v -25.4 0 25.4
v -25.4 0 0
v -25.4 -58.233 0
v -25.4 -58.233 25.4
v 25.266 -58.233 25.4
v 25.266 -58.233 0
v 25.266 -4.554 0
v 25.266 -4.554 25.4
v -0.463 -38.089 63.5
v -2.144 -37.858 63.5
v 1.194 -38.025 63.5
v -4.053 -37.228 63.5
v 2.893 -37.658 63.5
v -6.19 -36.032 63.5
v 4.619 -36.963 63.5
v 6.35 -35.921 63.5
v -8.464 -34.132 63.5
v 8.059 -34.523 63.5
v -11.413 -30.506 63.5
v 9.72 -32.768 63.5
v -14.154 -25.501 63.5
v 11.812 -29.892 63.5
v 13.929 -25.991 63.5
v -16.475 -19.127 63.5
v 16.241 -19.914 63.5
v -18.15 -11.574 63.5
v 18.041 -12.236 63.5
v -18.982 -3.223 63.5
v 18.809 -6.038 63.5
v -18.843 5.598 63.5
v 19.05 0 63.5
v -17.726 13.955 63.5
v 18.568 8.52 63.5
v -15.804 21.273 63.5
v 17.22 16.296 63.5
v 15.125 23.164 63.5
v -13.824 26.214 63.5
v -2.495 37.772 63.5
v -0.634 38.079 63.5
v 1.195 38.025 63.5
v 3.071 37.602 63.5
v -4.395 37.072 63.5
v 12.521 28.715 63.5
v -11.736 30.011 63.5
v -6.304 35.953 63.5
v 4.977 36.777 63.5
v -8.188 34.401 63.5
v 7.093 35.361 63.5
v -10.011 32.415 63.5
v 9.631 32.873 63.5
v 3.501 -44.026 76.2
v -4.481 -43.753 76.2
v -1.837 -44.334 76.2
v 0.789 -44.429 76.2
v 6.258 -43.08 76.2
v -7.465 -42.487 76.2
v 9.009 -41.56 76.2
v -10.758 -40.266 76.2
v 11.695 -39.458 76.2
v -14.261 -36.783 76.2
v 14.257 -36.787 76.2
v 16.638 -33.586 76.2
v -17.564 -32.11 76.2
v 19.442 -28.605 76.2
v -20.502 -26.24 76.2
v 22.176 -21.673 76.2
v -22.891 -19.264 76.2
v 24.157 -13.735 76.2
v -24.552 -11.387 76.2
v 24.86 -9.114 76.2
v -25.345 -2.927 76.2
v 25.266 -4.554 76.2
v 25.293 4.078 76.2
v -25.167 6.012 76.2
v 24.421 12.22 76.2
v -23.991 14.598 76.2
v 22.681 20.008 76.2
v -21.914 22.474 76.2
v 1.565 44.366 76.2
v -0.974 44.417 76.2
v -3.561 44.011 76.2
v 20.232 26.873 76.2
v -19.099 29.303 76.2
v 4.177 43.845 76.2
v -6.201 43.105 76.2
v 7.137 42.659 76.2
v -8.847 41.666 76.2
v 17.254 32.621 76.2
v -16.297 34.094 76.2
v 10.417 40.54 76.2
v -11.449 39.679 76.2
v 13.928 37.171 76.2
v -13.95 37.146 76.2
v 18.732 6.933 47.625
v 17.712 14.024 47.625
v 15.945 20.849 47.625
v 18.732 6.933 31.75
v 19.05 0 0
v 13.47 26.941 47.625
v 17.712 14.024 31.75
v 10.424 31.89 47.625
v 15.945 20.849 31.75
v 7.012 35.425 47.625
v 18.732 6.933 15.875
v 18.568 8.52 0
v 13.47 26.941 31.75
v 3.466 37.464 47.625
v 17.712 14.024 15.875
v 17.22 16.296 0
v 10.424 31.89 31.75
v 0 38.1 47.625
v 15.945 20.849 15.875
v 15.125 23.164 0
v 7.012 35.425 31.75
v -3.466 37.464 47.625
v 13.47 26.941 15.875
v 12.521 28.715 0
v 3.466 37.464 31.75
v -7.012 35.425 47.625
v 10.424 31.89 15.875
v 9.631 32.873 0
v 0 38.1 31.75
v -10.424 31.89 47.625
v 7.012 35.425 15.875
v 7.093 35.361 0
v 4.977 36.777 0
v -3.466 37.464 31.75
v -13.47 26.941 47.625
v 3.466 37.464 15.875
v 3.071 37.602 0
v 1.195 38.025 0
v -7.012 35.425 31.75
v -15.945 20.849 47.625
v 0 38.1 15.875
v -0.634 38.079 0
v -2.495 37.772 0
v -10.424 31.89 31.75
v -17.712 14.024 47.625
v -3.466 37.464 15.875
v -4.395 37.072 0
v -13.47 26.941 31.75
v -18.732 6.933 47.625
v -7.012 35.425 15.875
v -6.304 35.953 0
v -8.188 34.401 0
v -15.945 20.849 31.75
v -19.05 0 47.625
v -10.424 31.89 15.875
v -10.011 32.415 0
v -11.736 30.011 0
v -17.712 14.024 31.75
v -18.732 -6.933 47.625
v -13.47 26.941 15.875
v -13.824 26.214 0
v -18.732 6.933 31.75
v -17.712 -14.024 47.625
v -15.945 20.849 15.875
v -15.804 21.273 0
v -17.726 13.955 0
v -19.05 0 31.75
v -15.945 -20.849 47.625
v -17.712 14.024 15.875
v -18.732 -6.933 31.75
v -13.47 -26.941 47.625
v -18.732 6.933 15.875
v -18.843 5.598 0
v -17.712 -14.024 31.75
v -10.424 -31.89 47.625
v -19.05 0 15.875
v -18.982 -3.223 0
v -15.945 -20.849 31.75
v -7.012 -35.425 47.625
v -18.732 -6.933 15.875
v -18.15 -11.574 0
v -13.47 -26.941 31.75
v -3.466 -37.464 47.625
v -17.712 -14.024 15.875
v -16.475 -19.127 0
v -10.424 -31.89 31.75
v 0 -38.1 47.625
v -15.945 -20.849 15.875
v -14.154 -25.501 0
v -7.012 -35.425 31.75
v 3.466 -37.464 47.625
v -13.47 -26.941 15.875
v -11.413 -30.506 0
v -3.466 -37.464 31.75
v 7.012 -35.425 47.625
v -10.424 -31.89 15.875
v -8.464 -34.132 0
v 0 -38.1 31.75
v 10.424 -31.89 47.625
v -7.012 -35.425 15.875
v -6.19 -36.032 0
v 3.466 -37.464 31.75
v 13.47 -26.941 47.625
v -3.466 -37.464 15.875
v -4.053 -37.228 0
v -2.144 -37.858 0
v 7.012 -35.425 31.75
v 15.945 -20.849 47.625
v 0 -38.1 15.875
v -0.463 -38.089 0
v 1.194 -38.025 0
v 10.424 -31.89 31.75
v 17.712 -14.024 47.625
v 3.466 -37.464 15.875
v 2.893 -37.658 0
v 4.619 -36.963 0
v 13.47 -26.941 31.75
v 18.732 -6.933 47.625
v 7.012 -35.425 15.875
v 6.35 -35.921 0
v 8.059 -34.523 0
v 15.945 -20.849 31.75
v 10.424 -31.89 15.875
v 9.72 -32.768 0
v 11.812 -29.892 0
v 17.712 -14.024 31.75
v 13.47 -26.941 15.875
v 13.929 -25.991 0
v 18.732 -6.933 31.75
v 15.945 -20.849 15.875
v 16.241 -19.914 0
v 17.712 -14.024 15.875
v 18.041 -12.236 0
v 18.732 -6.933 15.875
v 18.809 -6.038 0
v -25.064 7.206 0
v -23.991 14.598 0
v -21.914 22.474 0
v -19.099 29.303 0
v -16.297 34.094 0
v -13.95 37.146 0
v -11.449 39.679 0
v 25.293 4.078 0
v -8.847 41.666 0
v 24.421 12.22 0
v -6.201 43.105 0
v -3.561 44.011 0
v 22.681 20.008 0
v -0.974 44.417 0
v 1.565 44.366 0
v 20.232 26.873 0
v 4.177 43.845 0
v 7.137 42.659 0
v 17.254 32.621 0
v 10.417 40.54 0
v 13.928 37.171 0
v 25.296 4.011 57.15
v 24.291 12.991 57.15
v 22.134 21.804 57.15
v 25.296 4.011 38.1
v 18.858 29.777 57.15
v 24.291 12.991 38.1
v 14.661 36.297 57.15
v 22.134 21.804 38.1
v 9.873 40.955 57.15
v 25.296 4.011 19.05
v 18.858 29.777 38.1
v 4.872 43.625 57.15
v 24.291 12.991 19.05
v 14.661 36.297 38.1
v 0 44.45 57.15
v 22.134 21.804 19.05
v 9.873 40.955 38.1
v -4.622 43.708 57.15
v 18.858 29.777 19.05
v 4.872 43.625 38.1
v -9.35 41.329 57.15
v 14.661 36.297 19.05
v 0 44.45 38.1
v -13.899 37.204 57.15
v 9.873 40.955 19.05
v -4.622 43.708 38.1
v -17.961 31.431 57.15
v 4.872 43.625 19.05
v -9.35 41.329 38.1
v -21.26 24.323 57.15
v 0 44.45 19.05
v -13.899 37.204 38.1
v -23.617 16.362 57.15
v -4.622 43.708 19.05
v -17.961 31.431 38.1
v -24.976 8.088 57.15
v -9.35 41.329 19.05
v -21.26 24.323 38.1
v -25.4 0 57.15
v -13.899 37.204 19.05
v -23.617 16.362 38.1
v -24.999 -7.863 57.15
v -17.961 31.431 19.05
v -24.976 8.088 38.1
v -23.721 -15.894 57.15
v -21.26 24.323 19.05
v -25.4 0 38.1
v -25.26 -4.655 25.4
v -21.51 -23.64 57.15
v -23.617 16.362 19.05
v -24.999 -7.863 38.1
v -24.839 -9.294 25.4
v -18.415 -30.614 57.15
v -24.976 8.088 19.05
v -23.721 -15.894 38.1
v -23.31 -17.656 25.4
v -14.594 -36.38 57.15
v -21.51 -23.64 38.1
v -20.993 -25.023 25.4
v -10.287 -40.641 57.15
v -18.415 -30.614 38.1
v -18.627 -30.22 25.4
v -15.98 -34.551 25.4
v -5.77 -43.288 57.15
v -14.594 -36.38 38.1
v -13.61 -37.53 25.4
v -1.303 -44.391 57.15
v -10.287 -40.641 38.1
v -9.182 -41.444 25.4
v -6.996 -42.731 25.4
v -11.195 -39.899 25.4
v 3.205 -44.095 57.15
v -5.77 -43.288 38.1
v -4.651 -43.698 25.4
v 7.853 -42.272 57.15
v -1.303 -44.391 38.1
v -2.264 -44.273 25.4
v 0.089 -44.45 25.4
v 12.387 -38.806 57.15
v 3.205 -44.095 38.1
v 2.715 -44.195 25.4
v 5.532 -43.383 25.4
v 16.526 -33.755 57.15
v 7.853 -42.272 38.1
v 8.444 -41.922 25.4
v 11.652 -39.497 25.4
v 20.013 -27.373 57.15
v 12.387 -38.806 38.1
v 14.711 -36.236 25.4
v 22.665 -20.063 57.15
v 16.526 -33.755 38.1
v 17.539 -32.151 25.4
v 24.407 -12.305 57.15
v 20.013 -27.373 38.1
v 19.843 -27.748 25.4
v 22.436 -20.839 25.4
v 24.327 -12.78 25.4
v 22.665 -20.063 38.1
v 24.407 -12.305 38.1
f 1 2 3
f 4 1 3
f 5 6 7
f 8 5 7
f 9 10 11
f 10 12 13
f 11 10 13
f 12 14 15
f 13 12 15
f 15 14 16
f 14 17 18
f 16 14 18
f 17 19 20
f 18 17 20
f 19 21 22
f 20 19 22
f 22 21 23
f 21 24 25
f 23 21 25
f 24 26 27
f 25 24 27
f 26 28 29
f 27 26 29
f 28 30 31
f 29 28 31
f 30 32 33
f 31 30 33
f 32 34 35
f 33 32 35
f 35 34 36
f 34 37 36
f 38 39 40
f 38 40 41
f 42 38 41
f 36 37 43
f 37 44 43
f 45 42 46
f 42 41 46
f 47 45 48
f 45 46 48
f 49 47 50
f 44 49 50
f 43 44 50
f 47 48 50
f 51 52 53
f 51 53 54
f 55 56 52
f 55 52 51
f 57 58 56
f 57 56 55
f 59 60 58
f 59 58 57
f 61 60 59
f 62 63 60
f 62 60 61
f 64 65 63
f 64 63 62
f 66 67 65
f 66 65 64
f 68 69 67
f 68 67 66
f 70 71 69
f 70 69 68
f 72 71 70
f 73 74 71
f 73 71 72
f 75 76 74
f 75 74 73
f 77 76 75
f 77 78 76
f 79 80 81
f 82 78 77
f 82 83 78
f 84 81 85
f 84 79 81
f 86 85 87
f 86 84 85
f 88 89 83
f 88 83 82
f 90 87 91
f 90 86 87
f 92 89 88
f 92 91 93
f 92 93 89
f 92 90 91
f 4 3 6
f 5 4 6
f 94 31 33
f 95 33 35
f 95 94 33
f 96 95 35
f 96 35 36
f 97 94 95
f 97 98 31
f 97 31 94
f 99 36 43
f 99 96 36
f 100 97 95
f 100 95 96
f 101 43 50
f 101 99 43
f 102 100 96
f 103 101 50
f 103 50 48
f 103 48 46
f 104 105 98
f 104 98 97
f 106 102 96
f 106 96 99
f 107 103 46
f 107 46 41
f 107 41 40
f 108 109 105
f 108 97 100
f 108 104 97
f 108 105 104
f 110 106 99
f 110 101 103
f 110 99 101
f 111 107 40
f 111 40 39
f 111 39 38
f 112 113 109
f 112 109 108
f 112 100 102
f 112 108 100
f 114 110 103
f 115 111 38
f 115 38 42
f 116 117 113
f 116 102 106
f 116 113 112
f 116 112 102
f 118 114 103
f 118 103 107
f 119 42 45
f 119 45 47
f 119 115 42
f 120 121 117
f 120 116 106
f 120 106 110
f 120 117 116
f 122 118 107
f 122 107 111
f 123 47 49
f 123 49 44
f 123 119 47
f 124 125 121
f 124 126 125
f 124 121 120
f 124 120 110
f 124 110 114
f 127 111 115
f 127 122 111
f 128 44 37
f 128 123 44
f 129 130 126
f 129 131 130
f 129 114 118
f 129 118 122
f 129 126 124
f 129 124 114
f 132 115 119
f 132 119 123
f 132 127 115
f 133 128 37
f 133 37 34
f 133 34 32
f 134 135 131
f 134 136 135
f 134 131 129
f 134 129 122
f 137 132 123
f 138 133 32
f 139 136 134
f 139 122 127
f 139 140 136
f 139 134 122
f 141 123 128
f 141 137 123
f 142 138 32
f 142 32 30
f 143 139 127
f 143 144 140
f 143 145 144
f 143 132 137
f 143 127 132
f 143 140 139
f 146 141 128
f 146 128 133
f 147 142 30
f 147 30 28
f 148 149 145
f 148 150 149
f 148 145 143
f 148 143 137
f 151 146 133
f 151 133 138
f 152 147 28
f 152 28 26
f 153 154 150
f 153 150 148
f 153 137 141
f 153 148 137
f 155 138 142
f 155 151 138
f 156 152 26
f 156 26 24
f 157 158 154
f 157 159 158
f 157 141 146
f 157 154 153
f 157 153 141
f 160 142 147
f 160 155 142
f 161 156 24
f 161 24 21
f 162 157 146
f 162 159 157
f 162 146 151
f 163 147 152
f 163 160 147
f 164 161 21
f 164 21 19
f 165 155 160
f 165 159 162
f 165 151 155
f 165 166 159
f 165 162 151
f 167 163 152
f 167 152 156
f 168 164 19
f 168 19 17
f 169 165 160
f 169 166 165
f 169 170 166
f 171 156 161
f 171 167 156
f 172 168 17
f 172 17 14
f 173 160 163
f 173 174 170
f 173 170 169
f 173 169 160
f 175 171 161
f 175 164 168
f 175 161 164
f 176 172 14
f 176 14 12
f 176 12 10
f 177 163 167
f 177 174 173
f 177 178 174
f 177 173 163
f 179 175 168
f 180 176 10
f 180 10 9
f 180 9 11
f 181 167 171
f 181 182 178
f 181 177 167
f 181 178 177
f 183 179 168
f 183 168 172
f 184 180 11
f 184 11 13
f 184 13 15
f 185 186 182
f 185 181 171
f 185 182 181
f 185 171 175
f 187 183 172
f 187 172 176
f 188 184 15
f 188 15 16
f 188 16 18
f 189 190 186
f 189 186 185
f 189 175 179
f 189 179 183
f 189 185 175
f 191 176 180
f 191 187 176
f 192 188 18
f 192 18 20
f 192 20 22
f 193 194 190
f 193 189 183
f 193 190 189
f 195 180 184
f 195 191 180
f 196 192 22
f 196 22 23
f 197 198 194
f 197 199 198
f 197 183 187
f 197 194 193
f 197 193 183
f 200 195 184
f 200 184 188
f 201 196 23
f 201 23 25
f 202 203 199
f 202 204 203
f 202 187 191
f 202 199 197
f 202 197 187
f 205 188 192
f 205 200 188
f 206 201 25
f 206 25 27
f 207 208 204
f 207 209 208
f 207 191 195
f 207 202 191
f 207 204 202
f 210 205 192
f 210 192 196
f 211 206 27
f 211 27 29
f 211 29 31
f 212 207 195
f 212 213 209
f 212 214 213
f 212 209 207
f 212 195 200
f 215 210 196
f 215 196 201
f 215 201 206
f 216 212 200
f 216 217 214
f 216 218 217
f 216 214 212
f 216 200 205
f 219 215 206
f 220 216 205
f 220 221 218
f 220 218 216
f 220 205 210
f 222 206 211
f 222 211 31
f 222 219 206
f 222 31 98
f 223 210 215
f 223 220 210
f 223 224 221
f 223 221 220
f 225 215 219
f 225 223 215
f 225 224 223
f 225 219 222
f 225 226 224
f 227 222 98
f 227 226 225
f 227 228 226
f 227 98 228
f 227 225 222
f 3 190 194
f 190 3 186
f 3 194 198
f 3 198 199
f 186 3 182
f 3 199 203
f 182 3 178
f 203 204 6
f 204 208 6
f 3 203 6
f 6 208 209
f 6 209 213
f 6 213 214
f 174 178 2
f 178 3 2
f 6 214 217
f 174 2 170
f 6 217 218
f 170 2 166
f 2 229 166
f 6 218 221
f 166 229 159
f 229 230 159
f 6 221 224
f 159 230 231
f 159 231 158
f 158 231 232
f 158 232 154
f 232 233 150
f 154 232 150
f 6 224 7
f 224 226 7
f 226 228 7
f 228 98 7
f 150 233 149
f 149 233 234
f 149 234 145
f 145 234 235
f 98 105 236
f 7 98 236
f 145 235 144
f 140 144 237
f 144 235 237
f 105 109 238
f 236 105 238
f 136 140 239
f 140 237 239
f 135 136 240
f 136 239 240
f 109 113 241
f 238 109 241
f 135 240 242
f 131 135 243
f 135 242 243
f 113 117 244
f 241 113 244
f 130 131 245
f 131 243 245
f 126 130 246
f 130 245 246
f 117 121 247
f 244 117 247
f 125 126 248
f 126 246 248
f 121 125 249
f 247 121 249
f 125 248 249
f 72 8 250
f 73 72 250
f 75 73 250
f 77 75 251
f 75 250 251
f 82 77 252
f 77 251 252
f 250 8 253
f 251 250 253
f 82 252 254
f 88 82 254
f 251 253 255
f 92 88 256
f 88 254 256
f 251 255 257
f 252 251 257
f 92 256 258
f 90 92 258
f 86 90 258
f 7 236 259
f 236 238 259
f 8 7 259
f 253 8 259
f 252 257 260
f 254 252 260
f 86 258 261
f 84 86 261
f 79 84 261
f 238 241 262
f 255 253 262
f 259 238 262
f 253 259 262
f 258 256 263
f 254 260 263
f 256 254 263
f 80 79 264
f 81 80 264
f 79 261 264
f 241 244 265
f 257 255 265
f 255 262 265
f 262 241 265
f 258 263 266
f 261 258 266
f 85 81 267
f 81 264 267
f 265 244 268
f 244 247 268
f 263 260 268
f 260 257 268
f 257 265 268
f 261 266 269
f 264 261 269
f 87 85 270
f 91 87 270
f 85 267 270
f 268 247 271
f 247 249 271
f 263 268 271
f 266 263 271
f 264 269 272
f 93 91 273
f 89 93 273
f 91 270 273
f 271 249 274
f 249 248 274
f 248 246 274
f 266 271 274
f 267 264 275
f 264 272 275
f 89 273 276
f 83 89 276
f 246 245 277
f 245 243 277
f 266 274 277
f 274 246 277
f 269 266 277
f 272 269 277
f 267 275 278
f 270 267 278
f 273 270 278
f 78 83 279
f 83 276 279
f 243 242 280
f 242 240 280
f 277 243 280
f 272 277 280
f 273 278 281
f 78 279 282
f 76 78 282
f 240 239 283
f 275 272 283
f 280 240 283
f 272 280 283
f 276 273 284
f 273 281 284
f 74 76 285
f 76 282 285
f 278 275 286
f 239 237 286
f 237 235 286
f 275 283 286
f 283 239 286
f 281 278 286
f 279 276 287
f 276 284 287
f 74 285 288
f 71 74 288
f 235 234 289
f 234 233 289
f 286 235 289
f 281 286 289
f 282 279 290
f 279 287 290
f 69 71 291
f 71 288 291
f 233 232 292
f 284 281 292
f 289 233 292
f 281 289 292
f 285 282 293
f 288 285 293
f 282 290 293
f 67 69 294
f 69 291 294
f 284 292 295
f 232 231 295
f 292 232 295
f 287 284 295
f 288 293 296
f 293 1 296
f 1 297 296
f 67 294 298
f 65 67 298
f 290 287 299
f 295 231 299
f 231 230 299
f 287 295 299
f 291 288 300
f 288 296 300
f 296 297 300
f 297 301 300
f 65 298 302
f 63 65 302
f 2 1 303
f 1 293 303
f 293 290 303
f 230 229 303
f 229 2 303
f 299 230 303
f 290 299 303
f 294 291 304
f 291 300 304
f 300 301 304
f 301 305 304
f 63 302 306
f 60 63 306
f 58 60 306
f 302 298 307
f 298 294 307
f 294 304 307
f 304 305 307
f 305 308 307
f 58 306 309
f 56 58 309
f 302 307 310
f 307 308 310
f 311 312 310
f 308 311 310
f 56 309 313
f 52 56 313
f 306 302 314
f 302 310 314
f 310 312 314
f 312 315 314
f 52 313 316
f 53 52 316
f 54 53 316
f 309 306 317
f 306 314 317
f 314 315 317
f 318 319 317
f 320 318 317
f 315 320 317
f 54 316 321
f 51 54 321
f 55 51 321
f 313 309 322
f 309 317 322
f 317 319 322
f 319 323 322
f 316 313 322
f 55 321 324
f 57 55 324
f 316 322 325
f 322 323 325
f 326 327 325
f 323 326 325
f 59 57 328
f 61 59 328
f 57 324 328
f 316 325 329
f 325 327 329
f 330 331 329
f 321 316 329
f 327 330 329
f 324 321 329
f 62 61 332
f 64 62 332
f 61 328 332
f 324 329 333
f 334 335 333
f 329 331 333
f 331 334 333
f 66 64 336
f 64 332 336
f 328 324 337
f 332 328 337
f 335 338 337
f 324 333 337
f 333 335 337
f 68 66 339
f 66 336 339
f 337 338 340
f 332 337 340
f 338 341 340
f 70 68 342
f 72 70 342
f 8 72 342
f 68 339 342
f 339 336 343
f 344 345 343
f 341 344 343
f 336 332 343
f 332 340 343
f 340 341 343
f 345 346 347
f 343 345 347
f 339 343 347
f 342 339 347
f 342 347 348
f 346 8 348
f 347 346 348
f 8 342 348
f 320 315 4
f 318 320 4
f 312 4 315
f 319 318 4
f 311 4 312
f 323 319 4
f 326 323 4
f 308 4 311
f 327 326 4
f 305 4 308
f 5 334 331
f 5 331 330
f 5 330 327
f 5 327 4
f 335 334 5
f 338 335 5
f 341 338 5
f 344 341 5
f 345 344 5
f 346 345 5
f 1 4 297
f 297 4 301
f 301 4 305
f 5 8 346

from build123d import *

# Parameters (mm, degrees)
F1_DEPTH = 76.2
F2_DEPTH = 63.5
F3_DEPTH = 25.4


with BuildPart() as f1:
    # F0 (on Top) → F1 (new body)
    with BuildSketch(Plane.XY):
        with BuildLine():
            Line((19.05, 0), (-19.05, 0))
            add(Edge.make_bspline(
                [(-19.05, 0), (-19.05, -38.1), (0, -38.1), (19.05, -38.1), (19.05, 0)],
                knots=[1.5707963268, 1.5707963268, 1.5707963268, 3.1415926536, 3.1415926536, 4.7123889804, 4.7123889804, 4.7123889804], degree=2, weights=[1, 0.7071067812, 1, 0.7071067812, 1]))
        make_face()
        with BuildLine():
            add(Edge.make_bspline(
                [(0, 38.1), (-19.05, 38.1), (-19.05, 0)],
                knots=[0, 0, 0, 1.5707963268, 1.5707963268, 1.5707963268], degree=2, weights=[1, 0.7071067812, 1]))
            Line((-19.05, 0), (19.05, 0))
            add(Edge.make_bspline(
                [(19.05, 0), (19.05, 38.1), (0, 38.1)],
                knots=[4.7123889804, 4.7123889804, 4.7123889804, 6.2831853072, 6.2831853072, 6.2831853072], degree=2, weights=[1, 0.7071067812, 1]))
        make_face()
        with BuildLine():
            Line((-19.05, 0), (-25.4, 0))
            add(Edge.make_bspline(
                [(-25.4, 0), (-25.4, -42.225404776), (-1.3029652817, -44.3914770763), (22.7940694367, -46.5575493766), (25.266321376, -4.554374286)],
                knots=[1.5707963268, 1.5707963268, 1.5707963268, 3.0902722831, 3.0902722831, 4.6097482393, 4.6097482393, 4.6097482393], degree=2, weights=[1, 0.7250164983, 1, 0.7250164983, 1]))
            Line((25.266321376, -4.554374286), (25.266321376, 0))
            Line((25.266321376, 0), (19.05, 0))
            add(Edge.make_bspline(
                [(-19.05, 0), (-19.05, -38.1), (0, -38.1), (19.05, -38.1), (19.05, 0)],
                knots=[1.5707963268, 1.5707963268, 1.5707963268, 3.1415926536, 3.1415926536, 4.7123889804, 4.7123889804, 4.7123889804], degree=2, weights=[1, 0.7071067812, 1, 0.7071067812, 1]))
        make_face()
        with BuildLine():
            add(Edge.make_bspline(
                [(25.266321376, -4.554374286), (28.1506547413, 44.45), (0, 44.45)],
                knots=[4.6097482393, 4.6097482393, 4.6097482393, 6.2831853072, 6.2831853072, 6.2831853072], degree=2, weights=[1, 0.669902749, 1]))
            add(Edge.make_bspline(
                [(0, 44.45), (-25.4, 44.45), (-25.4, 0)],
                knots=[0, 0, 0, 1.5707963268, 1.5707963268, 1.5707963268], degree=2, weights=[1, 0.7071067812, 1]))
            Line((-25.4, 0), (-19.05, 0))
            add(Edge.make_bspline(
                [(0, 38.1), (-19.05, 38.1), (-19.05, 0)],
                knots=[0, 0, 0, 1.5707963268, 1.5707963268, 1.5707963268], degree=2, weights=[1, 0.7071067812, 1]))
            add(Edge.make_bspline(
                [(19.05, 0), (19.05, 38.1), (0, 38.1)],
                knots=[4.7123889804, 4.7123889804, 4.7123889804, 6.2831853072, 6.2831853072, 6.2831853072], degree=2, weights=[1, 0.7071067812, 1]))
            Line((19.05, 0), (25.266321376, 0))
            Line((25.266321376, 0), (25.266321376, -4.554374286))
        make_face()
    extrude(amount=F1_DEPTH)

    # F0 (on Top) → F2 (cut)
    with BuildSketch(Plane.XY):
        with BuildLine():
            Line((19.05, 0), (-19.05, 0))
            add(Edge.make_bspline(
                [(-19.05, 0), (-19.05, -38.1), (0, -38.1), (19.05, -38.1), (19.05, 0)],
                knots=[1.5707963268, 1.5707963268, 1.5707963268, 3.1415926536, 3.1415926536, 4.7123889804, 4.7123889804, 4.7123889804], degree=2, weights=[1, 0.7071067812, 1, 0.7071067812, 1]))
        make_face()
        with BuildLine():
            add(Edge.make_bspline(
                [(0, 38.1), (-19.05, 38.1), (-19.05, 0)],
                knots=[0, 0, 0, 1.5707963268, 1.5707963268, 1.5707963268], degree=2, weights=[1, 0.7071067812, 1]))
            Line((-19.05, 0), (19.05, 0))
            add(Edge.make_bspline(
                [(19.05, 0), (19.05, 38.1), (0, 38.1)],
                knots=[4.7123889804, 4.7123889804, 4.7123889804, 6.2831853072, 6.2831853072, 6.2831853072], degree=2, weights=[1, 0.7071067812, 1]))
        make_face()
    extrude(amount=F2_DEPTH, mode=Mode.SUBTRACT)

    # F0 (on Top) → F3 (join)
    with BuildSketch(Plane.XY):
        with BuildLine():
            add(Edge.make_bspline(
                [(25.266321376, -4.554374286), (28.1506547413, 44.45), (0, 44.45)],
                knots=[4.6097482393, 4.6097482393, 4.6097482393, 6.2831853072, 6.2831853072, 6.2831853072], degree=2, weights=[1, 0.669902749, 1]))
            add(Edge.make_bspline(
                [(0, 44.45), (-25.4, 44.45), (-25.4, 0)],
                knots=[0, 0, 0, 1.5707963268, 1.5707963268, 1.5707963268], degree=2, weights=[1, 0.7071067812, 1]))
            Line((-25.4, 0), (-19.05, 0))
            add(Edge.make_bspline(
                [(0, 38.1), (-19.05, 38.1), (-19.05, 0)],
                knots=[0, 0, 0, 1.5707963268, 1.5707963268, 1.5707963268], degree=2, weights=[1, 0.7071067812, 1]))
            add(Edge.make_bspline(
                [(19.05, 0), (19.05, 38.1), (0, 38.1)],
                knots=[4.7123889804, 4.7123889804, 4.7123889804, 6.2831853072, 6.2831853072, 6.2831853072], degree=2, weights=[1, 0.7071067812, 1]))
            Line((19.05, 0), (25.266321376, 0))
            Line((25.266321376, 0), (25.266321376, -4.554374286))
        make_face()
        with BuildLine():
            Line((-19.05, 0), (-25.4, 0))
            add(Edge.make_bspline(
                [(-25.4, 0), (-25.4, -42.225404776), (-1.3029652817, -44.3914770763), (22.7940694367, -46.5575493766), (25.266321376, -4.554374286)],
                knots=[1.5707963268, 1.5707963268, 1.5707963268, 3.0902722831, 3.0902722831, 4.6097482393, 4.6097482393, 4.6097482393], degree=2, weights=[1, 0.7250164983, 1, 0.7250164983, 1]))
            Line((25.266321376, -4.554374286), (25.266321376, 0))
            Line((25.266321376, 0), (19.05, 0))
            add(Edge.make_bspline(
                [(-19.05, 0), (-19.05, -38.1), (0, -38.1), (19.05, -38.1), (19.05, 0)],
                knots=[1.5707963268, 1.5707963268, 1.5707963268, 3.1415926536, 3.1415926536, 4.7123889804, 4.7123889804, 4.7123889804], degree=2, weights=[1, 0.7071067812, 1, 0.7071067812, 1]))
        make_face()
        with BuildLine():
            add(Edge.make_bspline(
                [(-25.4, 0), (-25.4, -42.225404776), (-1.3029652817, -44.3914770763), (22.7940694367, -46.5575493766), (25.266321376, -4.554374286)],
                knots=[1.5707963268, 1.5707963268, 1.5707963268, 3.0902722831, 3.0902722831, 4.6097482393, 4.6097482393, 4.6097482393], degree=2, weights=[1, 0.7250164983, 1, 0.7250164983, 1]))
            Line((-25.4, 0), (-25.4, -58.2333467901))
            Line((-25.4, -58.2333467901), (25.266321376, -58.2333467901))
            Line((25.266321376, -58.2333467901), (25.266321376, -4.554374286))
        make_face()
    extrude(amount=F3_DEPTH)


solid = f1.part
